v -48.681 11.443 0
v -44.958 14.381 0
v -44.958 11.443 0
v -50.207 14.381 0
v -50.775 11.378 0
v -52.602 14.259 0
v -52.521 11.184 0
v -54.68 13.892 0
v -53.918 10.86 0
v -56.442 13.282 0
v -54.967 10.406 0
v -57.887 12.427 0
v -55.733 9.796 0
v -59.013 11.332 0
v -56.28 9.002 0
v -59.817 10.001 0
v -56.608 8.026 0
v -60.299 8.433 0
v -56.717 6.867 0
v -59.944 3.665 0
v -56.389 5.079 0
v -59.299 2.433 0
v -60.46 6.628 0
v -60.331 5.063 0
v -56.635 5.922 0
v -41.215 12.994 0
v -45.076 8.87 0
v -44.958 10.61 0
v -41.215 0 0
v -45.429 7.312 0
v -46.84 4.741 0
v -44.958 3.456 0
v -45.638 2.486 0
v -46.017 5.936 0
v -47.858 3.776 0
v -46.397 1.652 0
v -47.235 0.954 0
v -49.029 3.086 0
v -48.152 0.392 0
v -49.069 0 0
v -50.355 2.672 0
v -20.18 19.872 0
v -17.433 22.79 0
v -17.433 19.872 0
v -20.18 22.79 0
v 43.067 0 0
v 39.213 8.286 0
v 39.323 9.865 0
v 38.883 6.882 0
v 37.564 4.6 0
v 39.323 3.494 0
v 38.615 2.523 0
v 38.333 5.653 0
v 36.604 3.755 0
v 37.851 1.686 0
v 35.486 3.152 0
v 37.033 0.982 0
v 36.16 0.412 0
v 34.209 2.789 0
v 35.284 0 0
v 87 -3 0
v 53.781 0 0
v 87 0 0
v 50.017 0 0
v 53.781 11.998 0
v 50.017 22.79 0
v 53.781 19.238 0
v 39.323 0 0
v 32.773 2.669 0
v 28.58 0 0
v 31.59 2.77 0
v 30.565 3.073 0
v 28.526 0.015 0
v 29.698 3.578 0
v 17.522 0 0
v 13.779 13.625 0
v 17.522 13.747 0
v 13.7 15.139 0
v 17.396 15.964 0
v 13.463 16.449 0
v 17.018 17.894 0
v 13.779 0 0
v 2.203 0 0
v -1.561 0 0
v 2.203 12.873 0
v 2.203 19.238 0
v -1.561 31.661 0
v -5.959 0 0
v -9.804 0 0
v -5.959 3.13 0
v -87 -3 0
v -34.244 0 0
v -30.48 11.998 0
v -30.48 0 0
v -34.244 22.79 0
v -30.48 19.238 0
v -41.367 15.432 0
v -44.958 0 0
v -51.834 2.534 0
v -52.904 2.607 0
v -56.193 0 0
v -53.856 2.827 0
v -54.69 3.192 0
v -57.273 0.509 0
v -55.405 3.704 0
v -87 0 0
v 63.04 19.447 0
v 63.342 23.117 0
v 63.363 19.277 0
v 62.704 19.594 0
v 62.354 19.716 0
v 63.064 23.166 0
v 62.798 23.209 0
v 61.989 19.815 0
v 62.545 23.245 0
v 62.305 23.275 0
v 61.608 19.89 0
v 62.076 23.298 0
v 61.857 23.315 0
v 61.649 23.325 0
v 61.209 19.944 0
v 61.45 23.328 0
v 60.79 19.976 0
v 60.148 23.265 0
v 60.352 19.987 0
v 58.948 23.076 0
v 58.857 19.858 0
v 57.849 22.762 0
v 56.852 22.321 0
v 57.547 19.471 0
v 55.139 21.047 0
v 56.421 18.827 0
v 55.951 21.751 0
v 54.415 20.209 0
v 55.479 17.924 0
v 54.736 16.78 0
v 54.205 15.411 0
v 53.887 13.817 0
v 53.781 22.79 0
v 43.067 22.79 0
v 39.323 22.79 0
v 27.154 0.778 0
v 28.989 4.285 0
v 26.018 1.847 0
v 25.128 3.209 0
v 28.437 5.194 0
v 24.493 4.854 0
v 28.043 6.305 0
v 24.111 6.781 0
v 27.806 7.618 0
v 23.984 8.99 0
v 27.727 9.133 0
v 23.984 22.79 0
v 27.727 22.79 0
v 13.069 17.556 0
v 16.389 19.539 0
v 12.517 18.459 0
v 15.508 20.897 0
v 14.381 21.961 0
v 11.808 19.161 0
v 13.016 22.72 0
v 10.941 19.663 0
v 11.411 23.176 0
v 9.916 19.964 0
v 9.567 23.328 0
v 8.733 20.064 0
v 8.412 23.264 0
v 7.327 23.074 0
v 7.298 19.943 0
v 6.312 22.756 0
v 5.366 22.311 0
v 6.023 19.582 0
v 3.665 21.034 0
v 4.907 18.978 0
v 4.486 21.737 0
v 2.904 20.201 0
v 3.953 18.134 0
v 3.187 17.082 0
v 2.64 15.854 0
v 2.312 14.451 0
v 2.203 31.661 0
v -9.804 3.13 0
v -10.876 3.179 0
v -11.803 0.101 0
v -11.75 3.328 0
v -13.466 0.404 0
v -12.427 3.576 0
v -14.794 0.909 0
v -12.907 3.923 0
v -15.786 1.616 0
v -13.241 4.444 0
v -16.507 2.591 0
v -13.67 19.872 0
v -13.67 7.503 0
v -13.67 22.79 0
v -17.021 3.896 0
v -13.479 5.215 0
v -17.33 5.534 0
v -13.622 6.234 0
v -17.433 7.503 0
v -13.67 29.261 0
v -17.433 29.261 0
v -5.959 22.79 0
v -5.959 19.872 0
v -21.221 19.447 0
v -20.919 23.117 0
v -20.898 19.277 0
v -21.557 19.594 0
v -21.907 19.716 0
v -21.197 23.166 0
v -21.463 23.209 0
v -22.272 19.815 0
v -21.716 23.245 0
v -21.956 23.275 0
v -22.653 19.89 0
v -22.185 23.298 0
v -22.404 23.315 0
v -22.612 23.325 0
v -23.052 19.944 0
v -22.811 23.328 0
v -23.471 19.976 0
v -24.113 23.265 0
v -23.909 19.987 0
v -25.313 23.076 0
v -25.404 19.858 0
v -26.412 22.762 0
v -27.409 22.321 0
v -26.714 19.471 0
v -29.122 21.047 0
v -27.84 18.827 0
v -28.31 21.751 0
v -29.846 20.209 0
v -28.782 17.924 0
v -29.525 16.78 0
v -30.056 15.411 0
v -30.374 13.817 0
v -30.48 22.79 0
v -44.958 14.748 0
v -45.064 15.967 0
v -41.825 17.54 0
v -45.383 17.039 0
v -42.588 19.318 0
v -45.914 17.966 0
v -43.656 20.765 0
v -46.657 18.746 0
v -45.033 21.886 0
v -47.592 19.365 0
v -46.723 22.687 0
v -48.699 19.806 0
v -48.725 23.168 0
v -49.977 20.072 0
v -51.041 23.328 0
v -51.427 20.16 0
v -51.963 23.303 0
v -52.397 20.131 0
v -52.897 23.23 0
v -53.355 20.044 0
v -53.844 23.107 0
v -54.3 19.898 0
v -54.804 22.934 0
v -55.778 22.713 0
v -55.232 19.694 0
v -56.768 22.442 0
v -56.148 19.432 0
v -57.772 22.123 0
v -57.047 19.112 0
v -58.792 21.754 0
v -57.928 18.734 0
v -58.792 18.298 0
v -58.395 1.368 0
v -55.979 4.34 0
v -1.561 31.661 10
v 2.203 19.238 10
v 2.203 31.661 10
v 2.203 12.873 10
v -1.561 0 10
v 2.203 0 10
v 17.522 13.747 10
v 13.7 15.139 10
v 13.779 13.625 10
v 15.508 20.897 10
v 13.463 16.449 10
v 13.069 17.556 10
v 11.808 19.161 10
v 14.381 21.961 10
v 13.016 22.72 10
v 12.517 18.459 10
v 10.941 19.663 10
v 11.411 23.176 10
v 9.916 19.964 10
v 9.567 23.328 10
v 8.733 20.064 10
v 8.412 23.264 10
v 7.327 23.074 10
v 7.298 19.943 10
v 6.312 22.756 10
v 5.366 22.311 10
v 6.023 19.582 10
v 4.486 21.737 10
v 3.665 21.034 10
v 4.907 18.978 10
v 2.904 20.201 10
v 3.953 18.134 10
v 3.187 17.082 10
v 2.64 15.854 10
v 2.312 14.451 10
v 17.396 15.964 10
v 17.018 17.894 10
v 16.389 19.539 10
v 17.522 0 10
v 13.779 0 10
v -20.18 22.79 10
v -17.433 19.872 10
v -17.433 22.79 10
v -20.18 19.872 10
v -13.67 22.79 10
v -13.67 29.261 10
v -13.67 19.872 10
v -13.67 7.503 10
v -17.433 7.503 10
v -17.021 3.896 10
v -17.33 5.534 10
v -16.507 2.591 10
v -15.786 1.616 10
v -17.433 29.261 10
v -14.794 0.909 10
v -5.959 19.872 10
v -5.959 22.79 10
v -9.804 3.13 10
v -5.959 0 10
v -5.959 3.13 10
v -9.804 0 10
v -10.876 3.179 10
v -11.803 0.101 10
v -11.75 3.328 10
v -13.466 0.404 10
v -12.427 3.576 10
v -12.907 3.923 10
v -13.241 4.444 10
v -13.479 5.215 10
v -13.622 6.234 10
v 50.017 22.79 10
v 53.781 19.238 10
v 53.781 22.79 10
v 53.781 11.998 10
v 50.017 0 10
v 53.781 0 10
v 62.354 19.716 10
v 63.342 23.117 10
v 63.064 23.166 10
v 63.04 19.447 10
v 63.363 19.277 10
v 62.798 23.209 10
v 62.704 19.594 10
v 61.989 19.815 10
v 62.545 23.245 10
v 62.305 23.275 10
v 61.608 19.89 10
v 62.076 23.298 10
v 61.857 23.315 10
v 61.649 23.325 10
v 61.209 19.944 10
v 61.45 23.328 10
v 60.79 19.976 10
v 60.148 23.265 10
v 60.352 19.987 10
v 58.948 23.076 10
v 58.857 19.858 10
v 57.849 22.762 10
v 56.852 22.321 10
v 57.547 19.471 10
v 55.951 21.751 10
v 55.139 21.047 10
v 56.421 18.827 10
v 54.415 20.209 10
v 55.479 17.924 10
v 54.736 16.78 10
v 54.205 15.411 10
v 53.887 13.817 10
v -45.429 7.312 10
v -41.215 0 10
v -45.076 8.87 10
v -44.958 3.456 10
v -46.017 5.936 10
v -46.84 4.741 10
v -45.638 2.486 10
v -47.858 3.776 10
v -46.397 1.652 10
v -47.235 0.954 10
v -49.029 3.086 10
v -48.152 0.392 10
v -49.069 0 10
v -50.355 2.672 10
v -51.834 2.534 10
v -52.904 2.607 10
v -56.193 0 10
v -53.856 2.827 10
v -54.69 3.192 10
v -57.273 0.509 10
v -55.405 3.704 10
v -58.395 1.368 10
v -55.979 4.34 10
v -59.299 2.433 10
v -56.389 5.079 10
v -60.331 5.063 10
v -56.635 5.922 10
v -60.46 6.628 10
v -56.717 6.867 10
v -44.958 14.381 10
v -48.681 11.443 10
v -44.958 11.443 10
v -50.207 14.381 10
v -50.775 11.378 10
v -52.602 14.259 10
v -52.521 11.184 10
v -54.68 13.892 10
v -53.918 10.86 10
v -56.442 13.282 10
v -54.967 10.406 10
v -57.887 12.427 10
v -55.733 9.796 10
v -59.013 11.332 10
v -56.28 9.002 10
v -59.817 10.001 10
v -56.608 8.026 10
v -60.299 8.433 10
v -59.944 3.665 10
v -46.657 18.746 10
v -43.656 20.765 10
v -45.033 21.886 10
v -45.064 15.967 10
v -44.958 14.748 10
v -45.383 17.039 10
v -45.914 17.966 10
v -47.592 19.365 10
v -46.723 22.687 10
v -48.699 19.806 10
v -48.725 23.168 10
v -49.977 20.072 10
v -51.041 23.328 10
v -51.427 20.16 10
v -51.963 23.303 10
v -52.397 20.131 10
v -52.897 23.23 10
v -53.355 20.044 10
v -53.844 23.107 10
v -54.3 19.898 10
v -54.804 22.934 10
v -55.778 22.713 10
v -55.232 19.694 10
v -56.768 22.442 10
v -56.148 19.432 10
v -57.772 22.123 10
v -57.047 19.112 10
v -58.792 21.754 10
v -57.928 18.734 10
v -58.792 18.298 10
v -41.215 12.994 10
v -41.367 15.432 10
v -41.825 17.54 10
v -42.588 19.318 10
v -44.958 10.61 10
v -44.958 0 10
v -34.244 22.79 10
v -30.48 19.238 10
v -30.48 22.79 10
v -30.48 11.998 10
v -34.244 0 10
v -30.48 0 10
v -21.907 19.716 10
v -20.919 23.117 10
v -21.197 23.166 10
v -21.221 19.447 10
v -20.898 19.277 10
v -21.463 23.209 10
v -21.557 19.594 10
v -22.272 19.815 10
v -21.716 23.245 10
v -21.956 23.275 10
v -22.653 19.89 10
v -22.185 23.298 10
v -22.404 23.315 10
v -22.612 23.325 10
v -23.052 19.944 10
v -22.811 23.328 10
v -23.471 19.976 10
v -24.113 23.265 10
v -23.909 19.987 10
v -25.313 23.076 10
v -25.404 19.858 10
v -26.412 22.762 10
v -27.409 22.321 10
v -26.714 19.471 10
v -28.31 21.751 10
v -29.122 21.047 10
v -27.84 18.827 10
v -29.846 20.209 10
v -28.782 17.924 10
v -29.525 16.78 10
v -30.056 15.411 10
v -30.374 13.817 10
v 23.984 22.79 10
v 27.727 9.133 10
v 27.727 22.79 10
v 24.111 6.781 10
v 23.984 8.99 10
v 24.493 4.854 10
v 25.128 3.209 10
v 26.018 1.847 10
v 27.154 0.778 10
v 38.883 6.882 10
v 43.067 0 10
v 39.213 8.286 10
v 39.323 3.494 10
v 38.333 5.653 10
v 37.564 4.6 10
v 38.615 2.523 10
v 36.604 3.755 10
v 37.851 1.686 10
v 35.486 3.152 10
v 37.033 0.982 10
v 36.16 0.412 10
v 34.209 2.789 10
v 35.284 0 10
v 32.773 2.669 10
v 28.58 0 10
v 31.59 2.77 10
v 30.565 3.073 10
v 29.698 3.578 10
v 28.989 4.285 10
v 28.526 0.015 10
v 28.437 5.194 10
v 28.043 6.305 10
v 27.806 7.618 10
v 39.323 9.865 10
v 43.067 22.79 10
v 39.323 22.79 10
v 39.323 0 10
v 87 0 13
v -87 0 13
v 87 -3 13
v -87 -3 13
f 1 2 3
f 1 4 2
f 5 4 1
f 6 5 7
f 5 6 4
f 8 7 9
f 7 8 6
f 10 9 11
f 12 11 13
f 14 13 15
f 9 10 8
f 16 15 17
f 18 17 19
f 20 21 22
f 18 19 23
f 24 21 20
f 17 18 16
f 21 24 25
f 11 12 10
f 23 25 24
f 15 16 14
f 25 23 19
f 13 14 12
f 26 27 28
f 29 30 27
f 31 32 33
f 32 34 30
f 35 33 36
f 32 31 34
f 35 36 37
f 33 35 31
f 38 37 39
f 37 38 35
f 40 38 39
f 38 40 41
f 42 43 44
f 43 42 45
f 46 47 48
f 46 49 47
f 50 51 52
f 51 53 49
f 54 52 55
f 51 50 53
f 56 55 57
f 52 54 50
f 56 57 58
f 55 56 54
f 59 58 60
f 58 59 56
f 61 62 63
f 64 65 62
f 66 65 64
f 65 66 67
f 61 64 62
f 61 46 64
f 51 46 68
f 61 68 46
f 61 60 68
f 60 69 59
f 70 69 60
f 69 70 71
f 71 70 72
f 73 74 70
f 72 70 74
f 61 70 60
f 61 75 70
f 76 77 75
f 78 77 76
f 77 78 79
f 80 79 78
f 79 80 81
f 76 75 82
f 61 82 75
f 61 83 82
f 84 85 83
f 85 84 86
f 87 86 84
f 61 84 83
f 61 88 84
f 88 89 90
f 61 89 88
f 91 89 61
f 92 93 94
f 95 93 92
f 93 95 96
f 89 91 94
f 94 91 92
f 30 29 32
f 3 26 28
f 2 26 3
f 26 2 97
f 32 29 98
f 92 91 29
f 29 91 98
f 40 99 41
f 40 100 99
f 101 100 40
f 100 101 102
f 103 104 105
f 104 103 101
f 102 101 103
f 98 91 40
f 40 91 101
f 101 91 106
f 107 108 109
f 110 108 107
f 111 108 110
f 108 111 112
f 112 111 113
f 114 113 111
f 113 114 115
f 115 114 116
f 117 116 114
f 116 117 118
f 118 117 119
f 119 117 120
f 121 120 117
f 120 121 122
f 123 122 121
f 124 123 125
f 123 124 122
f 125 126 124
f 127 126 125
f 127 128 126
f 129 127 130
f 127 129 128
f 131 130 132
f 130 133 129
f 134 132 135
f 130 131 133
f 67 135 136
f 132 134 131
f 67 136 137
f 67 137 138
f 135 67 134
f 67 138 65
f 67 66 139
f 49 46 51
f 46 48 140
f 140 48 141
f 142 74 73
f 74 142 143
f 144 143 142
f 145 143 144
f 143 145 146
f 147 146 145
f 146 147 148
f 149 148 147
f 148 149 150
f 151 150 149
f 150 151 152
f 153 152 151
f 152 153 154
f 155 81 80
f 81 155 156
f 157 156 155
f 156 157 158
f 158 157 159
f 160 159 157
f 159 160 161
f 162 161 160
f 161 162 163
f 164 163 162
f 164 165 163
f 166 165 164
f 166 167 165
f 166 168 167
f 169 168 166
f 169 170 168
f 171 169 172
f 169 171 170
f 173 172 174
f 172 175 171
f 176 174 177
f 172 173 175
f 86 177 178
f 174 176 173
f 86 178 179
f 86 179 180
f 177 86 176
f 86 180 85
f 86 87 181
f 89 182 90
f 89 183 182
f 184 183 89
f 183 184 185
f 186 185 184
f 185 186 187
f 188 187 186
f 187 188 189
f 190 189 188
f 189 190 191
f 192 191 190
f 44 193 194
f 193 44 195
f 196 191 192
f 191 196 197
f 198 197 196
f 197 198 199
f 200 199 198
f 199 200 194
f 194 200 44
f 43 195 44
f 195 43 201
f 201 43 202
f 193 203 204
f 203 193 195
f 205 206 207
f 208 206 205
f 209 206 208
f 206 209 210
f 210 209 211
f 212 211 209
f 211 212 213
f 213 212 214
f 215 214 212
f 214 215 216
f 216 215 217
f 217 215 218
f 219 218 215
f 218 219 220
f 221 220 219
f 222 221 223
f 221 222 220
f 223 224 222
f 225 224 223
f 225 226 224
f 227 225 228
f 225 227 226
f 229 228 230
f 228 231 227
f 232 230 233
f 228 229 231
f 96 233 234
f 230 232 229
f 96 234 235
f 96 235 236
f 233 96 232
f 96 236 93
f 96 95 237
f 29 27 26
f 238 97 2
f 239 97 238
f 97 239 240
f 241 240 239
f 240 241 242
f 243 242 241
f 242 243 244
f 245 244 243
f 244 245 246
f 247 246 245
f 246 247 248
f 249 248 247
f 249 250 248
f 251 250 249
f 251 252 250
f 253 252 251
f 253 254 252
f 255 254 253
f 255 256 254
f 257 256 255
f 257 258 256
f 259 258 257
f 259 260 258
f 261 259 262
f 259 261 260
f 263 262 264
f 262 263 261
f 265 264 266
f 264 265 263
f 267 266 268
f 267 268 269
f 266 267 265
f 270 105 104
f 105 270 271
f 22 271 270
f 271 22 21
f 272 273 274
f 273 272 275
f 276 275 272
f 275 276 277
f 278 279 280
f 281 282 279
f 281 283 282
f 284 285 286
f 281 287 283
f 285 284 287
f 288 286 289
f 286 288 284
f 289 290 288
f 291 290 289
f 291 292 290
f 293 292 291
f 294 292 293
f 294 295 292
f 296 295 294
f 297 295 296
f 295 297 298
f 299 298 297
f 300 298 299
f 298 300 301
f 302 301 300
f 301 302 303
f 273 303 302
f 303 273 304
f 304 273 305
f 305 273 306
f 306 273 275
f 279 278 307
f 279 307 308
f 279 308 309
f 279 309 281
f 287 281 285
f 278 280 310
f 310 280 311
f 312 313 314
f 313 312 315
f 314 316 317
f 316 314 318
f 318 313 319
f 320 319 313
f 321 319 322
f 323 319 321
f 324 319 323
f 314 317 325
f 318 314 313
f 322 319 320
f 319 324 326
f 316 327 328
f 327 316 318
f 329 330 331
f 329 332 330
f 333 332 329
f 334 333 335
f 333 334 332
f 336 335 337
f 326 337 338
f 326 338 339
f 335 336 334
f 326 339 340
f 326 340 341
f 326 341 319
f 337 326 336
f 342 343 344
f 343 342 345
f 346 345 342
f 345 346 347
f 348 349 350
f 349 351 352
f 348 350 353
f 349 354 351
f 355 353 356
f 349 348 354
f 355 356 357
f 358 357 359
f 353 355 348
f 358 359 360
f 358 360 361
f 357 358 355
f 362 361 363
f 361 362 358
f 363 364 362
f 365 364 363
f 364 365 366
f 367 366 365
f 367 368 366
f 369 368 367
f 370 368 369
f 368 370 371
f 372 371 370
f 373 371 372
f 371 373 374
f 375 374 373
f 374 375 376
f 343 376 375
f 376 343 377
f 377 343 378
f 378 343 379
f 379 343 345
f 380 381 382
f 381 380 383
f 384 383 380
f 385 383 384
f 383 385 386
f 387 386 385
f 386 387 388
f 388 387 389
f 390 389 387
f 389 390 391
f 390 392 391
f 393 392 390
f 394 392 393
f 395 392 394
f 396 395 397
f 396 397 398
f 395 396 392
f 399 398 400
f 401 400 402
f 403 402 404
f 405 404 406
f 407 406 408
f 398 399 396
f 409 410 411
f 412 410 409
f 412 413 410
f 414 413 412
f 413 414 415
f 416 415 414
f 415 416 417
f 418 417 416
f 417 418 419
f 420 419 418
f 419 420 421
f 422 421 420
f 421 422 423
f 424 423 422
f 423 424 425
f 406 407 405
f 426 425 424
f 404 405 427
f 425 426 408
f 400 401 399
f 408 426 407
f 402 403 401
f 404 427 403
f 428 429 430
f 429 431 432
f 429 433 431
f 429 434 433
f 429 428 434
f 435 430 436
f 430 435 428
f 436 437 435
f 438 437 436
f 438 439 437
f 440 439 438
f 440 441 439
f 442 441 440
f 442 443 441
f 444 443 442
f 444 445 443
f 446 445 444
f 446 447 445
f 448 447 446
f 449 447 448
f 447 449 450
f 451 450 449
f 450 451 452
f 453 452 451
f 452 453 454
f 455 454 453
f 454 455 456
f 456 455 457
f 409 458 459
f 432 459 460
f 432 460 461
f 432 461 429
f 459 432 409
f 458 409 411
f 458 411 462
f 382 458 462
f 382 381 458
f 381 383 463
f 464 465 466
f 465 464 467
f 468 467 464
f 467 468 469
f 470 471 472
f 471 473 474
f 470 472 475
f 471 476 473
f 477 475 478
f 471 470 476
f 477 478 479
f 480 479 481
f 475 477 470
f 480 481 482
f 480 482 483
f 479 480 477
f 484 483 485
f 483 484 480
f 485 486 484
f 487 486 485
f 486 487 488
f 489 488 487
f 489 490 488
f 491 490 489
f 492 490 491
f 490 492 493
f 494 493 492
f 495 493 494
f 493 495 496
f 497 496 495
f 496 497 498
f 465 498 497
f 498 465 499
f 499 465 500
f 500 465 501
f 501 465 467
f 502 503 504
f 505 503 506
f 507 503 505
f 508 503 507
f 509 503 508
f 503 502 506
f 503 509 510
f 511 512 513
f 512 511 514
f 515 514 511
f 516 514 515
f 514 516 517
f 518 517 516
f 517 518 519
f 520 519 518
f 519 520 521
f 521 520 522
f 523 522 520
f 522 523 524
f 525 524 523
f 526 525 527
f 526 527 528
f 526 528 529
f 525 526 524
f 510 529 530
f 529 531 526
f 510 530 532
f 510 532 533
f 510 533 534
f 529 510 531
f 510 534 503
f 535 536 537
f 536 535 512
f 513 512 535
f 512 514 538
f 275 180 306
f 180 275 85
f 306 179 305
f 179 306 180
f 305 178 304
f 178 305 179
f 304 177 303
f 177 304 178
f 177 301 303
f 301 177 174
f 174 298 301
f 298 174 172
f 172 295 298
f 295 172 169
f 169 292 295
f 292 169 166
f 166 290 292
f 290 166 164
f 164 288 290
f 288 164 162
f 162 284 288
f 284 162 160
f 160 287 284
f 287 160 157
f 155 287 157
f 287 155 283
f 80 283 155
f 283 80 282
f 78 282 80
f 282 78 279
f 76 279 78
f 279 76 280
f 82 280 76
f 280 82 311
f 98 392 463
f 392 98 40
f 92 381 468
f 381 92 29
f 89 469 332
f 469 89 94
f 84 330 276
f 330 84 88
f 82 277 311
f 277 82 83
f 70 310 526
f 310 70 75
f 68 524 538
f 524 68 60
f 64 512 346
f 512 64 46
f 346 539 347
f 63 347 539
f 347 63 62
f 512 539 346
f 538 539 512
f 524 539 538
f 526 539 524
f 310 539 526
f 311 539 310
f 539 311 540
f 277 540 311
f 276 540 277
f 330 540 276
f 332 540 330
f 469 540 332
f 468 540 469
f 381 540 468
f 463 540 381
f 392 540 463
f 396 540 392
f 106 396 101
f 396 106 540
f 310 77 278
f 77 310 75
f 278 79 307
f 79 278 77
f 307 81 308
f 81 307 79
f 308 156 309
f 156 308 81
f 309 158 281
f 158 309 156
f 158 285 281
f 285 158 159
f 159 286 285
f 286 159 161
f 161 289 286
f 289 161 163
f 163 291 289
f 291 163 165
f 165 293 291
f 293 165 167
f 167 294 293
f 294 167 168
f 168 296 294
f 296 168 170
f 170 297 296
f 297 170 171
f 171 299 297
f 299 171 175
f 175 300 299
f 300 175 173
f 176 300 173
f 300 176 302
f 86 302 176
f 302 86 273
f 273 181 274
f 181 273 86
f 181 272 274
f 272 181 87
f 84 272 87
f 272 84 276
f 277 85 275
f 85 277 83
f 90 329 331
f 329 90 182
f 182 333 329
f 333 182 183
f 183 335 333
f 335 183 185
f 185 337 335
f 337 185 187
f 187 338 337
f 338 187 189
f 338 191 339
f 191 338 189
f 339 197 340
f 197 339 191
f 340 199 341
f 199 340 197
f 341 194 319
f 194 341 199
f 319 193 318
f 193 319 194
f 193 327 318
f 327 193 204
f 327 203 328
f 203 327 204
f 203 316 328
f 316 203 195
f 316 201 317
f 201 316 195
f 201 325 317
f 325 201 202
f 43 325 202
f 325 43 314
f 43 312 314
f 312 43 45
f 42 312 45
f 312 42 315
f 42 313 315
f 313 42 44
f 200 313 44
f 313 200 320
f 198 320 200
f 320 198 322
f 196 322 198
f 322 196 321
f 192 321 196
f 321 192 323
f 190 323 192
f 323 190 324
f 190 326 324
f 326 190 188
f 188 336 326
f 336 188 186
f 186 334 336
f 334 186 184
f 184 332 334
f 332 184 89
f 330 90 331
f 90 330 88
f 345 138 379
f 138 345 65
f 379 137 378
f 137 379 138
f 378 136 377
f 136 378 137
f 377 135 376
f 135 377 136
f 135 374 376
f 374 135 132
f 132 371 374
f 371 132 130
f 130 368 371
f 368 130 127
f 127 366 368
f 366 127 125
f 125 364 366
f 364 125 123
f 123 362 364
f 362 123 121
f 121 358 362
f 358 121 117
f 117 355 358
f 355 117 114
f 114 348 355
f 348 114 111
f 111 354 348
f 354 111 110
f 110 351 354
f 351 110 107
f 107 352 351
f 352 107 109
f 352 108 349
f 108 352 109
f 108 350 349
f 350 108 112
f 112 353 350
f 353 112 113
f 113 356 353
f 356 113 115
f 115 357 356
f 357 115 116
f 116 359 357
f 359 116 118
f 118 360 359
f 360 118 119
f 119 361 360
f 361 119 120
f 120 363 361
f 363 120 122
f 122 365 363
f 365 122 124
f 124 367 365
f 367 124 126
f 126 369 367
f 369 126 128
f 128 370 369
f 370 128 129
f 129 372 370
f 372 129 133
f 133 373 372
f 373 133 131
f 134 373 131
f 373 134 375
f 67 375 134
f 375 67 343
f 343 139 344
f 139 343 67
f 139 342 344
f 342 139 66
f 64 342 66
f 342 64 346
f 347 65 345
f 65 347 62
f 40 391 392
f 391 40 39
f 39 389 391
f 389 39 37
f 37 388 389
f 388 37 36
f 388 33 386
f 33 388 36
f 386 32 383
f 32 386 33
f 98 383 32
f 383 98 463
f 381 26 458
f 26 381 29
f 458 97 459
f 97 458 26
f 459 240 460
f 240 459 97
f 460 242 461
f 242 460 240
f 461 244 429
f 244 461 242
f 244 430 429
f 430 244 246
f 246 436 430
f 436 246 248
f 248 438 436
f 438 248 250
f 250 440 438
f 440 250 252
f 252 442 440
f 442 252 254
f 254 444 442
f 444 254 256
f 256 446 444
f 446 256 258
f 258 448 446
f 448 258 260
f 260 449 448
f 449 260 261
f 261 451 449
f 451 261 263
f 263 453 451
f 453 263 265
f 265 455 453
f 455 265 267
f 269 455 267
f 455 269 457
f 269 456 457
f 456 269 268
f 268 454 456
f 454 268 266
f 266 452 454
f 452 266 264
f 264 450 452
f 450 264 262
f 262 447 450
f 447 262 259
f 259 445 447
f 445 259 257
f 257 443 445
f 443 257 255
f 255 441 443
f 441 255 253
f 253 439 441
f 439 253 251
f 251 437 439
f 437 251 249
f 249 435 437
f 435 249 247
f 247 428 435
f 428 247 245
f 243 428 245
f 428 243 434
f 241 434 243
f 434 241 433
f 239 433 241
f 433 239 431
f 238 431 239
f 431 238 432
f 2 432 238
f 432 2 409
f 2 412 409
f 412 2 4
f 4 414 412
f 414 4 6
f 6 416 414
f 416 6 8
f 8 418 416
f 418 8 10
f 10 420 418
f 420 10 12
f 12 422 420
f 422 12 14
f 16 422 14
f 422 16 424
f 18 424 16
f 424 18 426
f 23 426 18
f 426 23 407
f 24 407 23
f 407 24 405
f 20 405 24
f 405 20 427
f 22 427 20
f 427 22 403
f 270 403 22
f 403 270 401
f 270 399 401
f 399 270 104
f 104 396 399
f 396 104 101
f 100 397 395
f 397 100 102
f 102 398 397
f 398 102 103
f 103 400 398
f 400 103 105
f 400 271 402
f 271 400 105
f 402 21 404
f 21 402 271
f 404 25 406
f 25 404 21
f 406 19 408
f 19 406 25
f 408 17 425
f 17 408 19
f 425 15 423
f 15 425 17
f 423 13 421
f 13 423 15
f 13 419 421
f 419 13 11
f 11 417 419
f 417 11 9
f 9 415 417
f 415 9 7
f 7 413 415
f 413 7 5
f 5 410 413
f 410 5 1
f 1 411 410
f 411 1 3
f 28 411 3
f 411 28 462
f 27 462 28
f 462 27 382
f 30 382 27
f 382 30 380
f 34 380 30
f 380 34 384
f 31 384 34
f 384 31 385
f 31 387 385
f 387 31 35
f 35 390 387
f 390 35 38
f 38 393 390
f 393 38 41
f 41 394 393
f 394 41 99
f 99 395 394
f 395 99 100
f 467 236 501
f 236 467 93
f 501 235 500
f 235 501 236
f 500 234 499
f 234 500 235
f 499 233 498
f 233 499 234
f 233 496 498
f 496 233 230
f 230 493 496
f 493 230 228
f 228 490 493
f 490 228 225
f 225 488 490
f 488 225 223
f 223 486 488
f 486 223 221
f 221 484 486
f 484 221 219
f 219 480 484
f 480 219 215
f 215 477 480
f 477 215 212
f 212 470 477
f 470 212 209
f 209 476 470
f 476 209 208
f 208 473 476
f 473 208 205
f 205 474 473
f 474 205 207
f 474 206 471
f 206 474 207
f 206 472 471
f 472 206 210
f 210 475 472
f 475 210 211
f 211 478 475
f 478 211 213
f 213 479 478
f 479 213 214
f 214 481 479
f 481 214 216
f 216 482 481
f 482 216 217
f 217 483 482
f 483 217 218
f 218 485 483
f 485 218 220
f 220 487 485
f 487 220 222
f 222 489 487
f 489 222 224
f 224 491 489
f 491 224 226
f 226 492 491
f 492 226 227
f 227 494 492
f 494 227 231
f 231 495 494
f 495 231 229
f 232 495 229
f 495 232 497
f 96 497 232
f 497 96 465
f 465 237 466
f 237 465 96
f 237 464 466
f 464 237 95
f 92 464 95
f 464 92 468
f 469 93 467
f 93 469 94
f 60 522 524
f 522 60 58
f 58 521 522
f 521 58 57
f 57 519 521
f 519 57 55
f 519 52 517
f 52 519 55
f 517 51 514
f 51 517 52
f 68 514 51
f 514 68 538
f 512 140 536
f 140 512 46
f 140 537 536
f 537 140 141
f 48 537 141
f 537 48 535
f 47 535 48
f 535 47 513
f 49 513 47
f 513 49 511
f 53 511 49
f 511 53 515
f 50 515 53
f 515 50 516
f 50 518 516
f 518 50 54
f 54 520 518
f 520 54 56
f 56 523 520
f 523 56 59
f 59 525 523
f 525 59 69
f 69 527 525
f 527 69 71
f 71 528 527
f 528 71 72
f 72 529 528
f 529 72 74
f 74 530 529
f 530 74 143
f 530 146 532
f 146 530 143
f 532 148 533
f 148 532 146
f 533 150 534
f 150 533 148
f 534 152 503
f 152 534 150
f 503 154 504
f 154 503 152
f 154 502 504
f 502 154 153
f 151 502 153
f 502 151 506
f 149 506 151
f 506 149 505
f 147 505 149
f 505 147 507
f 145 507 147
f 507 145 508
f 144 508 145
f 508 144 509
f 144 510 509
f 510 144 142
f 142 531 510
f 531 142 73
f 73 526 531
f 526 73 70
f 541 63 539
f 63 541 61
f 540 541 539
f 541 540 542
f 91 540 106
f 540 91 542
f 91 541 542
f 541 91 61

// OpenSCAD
// file: Minecraft_Name.scad
module Minecraft_Name(text, font_size=30, extrude_height=10, extra_base=3, adjust_base_width=0, texture_width=1.6, texture_depth=0.4)
{
    nb_char = len(text);
    color("LimeGreen")
    
    union() {
        linear_extrude(height=extrude_height)
          text(text=text, size=font_size, font="Minecrafter", halign="center");
        translate([0, -extra_base/2, (extrude_height+extra_base)/2])
          cube(size=[nb_char*font_size+adjust_base_width, extra_base, extrude_height+extra_base], center=true);
    }
}
// main file
use <Minecraft_Name.scad>;

Minecraft_Name("arthur", font_size=30, extra_base=3, adjust_base_width=-6, texture_depth=0);
